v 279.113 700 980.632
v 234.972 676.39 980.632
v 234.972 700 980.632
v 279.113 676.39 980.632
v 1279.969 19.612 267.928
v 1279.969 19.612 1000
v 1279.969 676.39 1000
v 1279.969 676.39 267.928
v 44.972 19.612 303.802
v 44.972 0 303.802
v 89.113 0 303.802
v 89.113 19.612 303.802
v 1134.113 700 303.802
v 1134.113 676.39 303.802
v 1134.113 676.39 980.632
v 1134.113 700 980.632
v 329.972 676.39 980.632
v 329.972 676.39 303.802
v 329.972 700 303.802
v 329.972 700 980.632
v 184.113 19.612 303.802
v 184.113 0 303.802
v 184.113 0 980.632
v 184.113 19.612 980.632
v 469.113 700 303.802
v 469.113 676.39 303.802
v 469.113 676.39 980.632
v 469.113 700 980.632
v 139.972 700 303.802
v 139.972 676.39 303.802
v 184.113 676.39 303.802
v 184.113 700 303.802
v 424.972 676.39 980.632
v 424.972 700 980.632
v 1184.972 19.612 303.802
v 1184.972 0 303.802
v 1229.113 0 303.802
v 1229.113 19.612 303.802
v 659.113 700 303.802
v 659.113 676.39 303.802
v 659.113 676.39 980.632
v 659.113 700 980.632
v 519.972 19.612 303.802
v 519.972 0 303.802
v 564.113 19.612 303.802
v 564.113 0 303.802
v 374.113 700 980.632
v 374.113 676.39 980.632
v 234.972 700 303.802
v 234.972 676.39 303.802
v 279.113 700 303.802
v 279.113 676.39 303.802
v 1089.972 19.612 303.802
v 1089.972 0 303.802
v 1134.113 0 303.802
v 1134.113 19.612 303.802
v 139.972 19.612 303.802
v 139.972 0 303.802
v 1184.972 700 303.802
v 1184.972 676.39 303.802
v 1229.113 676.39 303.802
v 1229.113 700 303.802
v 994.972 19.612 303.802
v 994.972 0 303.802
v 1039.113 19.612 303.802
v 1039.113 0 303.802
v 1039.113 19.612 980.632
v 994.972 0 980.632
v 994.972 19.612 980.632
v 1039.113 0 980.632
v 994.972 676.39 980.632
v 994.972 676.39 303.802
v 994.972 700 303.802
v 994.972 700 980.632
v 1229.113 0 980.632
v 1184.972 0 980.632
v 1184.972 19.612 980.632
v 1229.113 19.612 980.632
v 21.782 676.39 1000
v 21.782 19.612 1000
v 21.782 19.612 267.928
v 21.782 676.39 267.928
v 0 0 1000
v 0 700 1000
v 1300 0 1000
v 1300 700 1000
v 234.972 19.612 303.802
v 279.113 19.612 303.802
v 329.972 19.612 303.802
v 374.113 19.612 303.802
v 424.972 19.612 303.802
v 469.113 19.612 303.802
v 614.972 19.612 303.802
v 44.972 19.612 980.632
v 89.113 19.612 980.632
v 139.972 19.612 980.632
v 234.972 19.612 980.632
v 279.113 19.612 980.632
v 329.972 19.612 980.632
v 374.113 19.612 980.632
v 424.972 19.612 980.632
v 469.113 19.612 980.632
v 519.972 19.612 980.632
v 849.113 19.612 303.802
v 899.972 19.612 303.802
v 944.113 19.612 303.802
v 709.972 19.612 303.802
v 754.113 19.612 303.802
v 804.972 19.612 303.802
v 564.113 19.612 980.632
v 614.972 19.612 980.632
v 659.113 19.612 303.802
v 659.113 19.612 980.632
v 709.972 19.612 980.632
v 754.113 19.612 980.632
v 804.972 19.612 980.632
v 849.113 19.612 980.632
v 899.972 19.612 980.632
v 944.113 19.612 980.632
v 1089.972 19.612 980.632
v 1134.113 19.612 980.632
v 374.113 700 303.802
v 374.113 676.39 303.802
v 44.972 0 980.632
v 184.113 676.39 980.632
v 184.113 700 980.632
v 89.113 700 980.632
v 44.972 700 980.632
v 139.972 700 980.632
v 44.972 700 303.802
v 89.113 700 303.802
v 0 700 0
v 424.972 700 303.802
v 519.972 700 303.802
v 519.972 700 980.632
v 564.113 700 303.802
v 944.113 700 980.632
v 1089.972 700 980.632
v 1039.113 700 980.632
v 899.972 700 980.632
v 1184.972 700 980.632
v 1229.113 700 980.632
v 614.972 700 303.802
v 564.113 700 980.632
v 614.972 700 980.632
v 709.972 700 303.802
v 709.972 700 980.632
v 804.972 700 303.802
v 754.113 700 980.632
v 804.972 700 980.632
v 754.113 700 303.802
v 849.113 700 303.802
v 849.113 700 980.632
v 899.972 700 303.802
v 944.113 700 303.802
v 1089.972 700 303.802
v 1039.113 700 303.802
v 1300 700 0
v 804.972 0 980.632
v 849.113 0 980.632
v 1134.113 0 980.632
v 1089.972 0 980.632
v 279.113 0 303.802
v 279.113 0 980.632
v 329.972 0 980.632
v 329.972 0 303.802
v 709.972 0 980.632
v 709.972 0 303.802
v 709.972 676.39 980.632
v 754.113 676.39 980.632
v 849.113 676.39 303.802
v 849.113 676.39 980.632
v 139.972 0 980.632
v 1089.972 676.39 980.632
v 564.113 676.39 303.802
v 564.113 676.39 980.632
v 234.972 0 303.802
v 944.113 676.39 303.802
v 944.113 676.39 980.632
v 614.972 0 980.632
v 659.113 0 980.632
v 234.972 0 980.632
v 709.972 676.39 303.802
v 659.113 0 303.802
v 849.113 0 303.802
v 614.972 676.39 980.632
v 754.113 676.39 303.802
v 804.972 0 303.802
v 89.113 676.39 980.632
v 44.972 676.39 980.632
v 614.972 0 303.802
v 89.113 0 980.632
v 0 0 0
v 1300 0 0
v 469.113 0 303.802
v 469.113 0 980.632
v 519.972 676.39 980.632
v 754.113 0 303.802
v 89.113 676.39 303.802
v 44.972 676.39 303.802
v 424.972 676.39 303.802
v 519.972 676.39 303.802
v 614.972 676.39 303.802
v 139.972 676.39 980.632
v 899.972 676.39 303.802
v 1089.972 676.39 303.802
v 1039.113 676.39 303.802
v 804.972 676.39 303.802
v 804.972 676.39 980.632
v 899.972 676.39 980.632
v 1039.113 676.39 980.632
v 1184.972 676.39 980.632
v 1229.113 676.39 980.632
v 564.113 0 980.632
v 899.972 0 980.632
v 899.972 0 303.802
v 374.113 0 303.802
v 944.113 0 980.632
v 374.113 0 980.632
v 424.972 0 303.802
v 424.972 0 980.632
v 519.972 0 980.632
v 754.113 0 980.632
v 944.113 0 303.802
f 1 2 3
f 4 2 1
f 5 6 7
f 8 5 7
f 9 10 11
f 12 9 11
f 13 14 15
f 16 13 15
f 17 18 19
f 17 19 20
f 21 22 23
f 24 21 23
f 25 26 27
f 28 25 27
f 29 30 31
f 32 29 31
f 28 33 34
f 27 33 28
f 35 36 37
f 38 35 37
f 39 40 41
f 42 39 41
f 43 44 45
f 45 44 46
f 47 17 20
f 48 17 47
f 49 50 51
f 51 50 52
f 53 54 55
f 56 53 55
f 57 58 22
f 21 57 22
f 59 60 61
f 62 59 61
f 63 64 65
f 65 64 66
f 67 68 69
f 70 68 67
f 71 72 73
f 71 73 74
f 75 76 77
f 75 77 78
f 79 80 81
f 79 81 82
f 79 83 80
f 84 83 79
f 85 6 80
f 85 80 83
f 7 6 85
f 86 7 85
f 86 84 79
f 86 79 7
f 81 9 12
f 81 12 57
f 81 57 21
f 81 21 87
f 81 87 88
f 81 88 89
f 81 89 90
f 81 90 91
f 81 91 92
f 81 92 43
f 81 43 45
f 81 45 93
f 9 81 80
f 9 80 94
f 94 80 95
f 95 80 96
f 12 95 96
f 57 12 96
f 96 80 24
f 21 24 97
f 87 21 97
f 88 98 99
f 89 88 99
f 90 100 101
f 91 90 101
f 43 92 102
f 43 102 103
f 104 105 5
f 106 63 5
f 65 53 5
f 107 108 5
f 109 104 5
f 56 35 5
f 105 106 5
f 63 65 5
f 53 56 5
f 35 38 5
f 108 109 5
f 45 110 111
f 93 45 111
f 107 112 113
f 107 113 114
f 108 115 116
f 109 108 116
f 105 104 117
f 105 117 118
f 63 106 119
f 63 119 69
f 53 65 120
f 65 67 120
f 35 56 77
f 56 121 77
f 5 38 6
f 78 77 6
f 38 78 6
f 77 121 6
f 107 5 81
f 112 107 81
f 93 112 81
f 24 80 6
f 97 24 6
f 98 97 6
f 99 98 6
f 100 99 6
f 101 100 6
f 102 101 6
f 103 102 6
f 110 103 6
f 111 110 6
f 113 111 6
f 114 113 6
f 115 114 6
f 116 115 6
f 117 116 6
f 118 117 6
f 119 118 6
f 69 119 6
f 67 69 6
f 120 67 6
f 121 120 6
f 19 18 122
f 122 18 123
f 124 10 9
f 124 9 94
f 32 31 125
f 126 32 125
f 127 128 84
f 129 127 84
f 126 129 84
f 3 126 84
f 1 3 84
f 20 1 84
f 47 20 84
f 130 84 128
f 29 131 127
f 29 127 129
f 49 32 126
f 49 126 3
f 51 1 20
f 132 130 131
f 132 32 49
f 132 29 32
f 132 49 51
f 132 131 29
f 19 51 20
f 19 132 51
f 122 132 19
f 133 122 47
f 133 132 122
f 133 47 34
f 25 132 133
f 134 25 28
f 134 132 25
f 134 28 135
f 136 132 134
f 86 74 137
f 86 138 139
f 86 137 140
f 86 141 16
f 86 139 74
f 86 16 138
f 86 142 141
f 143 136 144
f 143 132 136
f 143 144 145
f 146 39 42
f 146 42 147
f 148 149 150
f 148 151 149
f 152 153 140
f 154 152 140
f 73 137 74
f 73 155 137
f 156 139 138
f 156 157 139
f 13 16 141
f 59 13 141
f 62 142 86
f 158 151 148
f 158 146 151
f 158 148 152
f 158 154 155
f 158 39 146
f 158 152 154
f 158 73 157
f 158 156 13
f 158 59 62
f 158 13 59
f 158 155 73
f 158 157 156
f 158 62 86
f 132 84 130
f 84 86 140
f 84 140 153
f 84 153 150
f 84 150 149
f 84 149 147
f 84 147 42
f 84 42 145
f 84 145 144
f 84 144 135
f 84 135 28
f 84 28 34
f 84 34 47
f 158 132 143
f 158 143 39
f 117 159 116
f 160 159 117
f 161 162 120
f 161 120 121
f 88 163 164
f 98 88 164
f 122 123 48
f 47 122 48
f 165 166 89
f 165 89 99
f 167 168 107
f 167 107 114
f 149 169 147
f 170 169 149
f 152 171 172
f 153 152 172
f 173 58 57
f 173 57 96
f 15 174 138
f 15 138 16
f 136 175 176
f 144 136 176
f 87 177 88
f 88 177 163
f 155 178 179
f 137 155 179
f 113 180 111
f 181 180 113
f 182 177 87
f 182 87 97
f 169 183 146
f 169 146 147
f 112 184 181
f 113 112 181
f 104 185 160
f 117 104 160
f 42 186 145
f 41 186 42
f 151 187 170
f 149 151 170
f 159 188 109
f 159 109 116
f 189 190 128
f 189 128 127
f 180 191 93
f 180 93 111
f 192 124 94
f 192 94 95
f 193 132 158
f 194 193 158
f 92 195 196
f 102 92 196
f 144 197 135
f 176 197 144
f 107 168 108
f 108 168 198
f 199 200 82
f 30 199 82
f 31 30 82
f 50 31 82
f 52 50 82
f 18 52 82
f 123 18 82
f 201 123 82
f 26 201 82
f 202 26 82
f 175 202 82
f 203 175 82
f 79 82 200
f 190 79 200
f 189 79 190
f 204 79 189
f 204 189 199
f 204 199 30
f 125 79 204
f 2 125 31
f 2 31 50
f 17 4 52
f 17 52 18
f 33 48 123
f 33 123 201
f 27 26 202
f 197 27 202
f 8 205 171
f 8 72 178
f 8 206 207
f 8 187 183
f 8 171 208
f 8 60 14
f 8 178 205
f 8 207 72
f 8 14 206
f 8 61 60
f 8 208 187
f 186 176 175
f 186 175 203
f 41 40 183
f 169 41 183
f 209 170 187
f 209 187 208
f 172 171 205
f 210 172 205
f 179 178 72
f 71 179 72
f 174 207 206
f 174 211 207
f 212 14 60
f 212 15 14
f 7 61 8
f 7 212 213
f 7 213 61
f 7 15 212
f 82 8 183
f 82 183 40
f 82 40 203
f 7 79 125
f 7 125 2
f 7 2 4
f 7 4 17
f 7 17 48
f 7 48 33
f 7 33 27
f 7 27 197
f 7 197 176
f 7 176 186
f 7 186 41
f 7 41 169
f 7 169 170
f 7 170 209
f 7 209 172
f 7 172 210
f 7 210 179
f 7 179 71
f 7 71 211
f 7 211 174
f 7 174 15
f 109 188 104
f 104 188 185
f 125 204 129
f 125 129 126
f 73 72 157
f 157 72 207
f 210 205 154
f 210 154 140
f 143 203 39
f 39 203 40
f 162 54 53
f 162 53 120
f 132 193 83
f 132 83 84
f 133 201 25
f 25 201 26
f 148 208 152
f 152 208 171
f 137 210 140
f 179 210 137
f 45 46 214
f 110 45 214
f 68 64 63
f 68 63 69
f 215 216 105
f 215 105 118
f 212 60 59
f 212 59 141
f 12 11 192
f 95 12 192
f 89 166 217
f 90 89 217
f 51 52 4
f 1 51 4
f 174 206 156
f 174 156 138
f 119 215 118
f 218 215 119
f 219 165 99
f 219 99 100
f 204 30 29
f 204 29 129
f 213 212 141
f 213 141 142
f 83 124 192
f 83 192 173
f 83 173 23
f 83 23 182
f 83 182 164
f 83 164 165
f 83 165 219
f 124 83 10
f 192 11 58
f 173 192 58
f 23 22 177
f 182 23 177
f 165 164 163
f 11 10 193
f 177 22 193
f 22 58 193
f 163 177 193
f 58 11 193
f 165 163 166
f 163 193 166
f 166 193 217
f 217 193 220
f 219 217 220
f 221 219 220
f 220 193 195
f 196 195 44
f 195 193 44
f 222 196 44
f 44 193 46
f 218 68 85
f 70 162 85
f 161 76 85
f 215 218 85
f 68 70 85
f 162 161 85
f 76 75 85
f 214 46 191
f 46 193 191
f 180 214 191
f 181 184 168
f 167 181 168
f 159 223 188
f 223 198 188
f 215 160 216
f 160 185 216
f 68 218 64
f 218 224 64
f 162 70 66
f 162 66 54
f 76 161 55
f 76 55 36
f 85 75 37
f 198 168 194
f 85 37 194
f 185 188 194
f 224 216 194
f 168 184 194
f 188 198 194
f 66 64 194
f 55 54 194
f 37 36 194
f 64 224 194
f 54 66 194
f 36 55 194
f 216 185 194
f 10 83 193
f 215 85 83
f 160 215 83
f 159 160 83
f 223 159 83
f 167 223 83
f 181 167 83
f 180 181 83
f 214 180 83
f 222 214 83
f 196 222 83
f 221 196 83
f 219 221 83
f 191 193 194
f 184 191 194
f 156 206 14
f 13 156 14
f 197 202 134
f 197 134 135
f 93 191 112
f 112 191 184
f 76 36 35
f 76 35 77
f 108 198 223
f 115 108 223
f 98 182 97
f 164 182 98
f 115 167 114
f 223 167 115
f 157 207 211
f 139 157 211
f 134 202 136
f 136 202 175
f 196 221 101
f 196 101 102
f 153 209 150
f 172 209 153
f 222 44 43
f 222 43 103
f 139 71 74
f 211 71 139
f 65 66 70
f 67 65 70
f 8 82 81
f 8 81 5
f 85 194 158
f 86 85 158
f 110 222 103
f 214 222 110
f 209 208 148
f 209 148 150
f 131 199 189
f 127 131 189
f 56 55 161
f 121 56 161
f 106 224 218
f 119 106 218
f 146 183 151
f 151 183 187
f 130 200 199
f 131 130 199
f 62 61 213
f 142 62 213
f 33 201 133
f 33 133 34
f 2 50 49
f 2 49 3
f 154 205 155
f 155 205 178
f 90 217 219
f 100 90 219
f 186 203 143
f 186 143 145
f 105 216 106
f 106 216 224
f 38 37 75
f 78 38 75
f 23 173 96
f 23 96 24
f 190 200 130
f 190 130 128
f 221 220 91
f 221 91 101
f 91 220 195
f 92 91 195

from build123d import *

# Parameters (mm, degrees)
F0_W     = 1300
F0_H     = 700
F1_DEPTH = 1000
F2_W     = 1258.1877
F2_H     = 656.777838
F3_DEPTH = 732.07246
F4_W     = 44.141058
F4_H     = 676.829636
F5_DEPTH = 781.75431


with BuildPart() as f1:
    # F0 (on Top) → F1 (new body)
    with BuildSketch(Plane.XY):
        with Locations((650, 350)):
            Rectangle(F0_W, F0_H)
    extrude(amount=F1_DEPTH)

    # F2 (on face) → F3 (cut)
    with BuildSketch(Plane.XY.offset(1000)):
        with Locations((650.875485, 348.001252)):
            Rectangle(F2_W, F2_H)
    extrude(amount=-F3_DEPTH, mode=Mode.SUBTRACT)

    # F4 (on face) → F5 (cut)
    with BuildSketch(Plane.XZ):
        with Locations((67.042565, 642.217189)):
            Rectangle(F4_W, F4_H)
        with Locations((162.042565, 642.217189)):
            Rectangle(F4_W, F4_H)
        with Locations((257.042565, 642.217189)):
            Rectangle(F4_W, F4_H)
        with Locations((352.042565, 642.217189)):
            Rectangle(F4_W, F4_H)
        with Locations((447.042565, 642.217189)):
            Rectangle(F4_W, F4_H)
        with Locations((542.042565, 642.217189)):
            Rectangle(F4_W, F4_H)
        with Locations((637.042565, 642.217189)):
            Rectangle(F4_W, F4_H)
        with Locations((732.042565, 642.217189)):
            Rectangle(F4_W, F4_H)
        with Locations((827.042565, 642.217189)):
            Rectangle(F4_W, F4_H)
        with Locations((922.042565, 642.217189)):
            Rectangle(F4_W, F4_H)
        with Locations((1017.042565, 642.217189)):
            Rectangle(F4_W, F4_H)
        with Locations((1112.042565, 642.217189)):
            Rectangle(F4_W, F4_H)
        with Locations((1207.042565, 642.217189)):
            Rectangle(F4_W, F4_H)
    extrude(amount=-F5_DEPTH, mode=Mode.SUBTRACT)


solid = f1.part
